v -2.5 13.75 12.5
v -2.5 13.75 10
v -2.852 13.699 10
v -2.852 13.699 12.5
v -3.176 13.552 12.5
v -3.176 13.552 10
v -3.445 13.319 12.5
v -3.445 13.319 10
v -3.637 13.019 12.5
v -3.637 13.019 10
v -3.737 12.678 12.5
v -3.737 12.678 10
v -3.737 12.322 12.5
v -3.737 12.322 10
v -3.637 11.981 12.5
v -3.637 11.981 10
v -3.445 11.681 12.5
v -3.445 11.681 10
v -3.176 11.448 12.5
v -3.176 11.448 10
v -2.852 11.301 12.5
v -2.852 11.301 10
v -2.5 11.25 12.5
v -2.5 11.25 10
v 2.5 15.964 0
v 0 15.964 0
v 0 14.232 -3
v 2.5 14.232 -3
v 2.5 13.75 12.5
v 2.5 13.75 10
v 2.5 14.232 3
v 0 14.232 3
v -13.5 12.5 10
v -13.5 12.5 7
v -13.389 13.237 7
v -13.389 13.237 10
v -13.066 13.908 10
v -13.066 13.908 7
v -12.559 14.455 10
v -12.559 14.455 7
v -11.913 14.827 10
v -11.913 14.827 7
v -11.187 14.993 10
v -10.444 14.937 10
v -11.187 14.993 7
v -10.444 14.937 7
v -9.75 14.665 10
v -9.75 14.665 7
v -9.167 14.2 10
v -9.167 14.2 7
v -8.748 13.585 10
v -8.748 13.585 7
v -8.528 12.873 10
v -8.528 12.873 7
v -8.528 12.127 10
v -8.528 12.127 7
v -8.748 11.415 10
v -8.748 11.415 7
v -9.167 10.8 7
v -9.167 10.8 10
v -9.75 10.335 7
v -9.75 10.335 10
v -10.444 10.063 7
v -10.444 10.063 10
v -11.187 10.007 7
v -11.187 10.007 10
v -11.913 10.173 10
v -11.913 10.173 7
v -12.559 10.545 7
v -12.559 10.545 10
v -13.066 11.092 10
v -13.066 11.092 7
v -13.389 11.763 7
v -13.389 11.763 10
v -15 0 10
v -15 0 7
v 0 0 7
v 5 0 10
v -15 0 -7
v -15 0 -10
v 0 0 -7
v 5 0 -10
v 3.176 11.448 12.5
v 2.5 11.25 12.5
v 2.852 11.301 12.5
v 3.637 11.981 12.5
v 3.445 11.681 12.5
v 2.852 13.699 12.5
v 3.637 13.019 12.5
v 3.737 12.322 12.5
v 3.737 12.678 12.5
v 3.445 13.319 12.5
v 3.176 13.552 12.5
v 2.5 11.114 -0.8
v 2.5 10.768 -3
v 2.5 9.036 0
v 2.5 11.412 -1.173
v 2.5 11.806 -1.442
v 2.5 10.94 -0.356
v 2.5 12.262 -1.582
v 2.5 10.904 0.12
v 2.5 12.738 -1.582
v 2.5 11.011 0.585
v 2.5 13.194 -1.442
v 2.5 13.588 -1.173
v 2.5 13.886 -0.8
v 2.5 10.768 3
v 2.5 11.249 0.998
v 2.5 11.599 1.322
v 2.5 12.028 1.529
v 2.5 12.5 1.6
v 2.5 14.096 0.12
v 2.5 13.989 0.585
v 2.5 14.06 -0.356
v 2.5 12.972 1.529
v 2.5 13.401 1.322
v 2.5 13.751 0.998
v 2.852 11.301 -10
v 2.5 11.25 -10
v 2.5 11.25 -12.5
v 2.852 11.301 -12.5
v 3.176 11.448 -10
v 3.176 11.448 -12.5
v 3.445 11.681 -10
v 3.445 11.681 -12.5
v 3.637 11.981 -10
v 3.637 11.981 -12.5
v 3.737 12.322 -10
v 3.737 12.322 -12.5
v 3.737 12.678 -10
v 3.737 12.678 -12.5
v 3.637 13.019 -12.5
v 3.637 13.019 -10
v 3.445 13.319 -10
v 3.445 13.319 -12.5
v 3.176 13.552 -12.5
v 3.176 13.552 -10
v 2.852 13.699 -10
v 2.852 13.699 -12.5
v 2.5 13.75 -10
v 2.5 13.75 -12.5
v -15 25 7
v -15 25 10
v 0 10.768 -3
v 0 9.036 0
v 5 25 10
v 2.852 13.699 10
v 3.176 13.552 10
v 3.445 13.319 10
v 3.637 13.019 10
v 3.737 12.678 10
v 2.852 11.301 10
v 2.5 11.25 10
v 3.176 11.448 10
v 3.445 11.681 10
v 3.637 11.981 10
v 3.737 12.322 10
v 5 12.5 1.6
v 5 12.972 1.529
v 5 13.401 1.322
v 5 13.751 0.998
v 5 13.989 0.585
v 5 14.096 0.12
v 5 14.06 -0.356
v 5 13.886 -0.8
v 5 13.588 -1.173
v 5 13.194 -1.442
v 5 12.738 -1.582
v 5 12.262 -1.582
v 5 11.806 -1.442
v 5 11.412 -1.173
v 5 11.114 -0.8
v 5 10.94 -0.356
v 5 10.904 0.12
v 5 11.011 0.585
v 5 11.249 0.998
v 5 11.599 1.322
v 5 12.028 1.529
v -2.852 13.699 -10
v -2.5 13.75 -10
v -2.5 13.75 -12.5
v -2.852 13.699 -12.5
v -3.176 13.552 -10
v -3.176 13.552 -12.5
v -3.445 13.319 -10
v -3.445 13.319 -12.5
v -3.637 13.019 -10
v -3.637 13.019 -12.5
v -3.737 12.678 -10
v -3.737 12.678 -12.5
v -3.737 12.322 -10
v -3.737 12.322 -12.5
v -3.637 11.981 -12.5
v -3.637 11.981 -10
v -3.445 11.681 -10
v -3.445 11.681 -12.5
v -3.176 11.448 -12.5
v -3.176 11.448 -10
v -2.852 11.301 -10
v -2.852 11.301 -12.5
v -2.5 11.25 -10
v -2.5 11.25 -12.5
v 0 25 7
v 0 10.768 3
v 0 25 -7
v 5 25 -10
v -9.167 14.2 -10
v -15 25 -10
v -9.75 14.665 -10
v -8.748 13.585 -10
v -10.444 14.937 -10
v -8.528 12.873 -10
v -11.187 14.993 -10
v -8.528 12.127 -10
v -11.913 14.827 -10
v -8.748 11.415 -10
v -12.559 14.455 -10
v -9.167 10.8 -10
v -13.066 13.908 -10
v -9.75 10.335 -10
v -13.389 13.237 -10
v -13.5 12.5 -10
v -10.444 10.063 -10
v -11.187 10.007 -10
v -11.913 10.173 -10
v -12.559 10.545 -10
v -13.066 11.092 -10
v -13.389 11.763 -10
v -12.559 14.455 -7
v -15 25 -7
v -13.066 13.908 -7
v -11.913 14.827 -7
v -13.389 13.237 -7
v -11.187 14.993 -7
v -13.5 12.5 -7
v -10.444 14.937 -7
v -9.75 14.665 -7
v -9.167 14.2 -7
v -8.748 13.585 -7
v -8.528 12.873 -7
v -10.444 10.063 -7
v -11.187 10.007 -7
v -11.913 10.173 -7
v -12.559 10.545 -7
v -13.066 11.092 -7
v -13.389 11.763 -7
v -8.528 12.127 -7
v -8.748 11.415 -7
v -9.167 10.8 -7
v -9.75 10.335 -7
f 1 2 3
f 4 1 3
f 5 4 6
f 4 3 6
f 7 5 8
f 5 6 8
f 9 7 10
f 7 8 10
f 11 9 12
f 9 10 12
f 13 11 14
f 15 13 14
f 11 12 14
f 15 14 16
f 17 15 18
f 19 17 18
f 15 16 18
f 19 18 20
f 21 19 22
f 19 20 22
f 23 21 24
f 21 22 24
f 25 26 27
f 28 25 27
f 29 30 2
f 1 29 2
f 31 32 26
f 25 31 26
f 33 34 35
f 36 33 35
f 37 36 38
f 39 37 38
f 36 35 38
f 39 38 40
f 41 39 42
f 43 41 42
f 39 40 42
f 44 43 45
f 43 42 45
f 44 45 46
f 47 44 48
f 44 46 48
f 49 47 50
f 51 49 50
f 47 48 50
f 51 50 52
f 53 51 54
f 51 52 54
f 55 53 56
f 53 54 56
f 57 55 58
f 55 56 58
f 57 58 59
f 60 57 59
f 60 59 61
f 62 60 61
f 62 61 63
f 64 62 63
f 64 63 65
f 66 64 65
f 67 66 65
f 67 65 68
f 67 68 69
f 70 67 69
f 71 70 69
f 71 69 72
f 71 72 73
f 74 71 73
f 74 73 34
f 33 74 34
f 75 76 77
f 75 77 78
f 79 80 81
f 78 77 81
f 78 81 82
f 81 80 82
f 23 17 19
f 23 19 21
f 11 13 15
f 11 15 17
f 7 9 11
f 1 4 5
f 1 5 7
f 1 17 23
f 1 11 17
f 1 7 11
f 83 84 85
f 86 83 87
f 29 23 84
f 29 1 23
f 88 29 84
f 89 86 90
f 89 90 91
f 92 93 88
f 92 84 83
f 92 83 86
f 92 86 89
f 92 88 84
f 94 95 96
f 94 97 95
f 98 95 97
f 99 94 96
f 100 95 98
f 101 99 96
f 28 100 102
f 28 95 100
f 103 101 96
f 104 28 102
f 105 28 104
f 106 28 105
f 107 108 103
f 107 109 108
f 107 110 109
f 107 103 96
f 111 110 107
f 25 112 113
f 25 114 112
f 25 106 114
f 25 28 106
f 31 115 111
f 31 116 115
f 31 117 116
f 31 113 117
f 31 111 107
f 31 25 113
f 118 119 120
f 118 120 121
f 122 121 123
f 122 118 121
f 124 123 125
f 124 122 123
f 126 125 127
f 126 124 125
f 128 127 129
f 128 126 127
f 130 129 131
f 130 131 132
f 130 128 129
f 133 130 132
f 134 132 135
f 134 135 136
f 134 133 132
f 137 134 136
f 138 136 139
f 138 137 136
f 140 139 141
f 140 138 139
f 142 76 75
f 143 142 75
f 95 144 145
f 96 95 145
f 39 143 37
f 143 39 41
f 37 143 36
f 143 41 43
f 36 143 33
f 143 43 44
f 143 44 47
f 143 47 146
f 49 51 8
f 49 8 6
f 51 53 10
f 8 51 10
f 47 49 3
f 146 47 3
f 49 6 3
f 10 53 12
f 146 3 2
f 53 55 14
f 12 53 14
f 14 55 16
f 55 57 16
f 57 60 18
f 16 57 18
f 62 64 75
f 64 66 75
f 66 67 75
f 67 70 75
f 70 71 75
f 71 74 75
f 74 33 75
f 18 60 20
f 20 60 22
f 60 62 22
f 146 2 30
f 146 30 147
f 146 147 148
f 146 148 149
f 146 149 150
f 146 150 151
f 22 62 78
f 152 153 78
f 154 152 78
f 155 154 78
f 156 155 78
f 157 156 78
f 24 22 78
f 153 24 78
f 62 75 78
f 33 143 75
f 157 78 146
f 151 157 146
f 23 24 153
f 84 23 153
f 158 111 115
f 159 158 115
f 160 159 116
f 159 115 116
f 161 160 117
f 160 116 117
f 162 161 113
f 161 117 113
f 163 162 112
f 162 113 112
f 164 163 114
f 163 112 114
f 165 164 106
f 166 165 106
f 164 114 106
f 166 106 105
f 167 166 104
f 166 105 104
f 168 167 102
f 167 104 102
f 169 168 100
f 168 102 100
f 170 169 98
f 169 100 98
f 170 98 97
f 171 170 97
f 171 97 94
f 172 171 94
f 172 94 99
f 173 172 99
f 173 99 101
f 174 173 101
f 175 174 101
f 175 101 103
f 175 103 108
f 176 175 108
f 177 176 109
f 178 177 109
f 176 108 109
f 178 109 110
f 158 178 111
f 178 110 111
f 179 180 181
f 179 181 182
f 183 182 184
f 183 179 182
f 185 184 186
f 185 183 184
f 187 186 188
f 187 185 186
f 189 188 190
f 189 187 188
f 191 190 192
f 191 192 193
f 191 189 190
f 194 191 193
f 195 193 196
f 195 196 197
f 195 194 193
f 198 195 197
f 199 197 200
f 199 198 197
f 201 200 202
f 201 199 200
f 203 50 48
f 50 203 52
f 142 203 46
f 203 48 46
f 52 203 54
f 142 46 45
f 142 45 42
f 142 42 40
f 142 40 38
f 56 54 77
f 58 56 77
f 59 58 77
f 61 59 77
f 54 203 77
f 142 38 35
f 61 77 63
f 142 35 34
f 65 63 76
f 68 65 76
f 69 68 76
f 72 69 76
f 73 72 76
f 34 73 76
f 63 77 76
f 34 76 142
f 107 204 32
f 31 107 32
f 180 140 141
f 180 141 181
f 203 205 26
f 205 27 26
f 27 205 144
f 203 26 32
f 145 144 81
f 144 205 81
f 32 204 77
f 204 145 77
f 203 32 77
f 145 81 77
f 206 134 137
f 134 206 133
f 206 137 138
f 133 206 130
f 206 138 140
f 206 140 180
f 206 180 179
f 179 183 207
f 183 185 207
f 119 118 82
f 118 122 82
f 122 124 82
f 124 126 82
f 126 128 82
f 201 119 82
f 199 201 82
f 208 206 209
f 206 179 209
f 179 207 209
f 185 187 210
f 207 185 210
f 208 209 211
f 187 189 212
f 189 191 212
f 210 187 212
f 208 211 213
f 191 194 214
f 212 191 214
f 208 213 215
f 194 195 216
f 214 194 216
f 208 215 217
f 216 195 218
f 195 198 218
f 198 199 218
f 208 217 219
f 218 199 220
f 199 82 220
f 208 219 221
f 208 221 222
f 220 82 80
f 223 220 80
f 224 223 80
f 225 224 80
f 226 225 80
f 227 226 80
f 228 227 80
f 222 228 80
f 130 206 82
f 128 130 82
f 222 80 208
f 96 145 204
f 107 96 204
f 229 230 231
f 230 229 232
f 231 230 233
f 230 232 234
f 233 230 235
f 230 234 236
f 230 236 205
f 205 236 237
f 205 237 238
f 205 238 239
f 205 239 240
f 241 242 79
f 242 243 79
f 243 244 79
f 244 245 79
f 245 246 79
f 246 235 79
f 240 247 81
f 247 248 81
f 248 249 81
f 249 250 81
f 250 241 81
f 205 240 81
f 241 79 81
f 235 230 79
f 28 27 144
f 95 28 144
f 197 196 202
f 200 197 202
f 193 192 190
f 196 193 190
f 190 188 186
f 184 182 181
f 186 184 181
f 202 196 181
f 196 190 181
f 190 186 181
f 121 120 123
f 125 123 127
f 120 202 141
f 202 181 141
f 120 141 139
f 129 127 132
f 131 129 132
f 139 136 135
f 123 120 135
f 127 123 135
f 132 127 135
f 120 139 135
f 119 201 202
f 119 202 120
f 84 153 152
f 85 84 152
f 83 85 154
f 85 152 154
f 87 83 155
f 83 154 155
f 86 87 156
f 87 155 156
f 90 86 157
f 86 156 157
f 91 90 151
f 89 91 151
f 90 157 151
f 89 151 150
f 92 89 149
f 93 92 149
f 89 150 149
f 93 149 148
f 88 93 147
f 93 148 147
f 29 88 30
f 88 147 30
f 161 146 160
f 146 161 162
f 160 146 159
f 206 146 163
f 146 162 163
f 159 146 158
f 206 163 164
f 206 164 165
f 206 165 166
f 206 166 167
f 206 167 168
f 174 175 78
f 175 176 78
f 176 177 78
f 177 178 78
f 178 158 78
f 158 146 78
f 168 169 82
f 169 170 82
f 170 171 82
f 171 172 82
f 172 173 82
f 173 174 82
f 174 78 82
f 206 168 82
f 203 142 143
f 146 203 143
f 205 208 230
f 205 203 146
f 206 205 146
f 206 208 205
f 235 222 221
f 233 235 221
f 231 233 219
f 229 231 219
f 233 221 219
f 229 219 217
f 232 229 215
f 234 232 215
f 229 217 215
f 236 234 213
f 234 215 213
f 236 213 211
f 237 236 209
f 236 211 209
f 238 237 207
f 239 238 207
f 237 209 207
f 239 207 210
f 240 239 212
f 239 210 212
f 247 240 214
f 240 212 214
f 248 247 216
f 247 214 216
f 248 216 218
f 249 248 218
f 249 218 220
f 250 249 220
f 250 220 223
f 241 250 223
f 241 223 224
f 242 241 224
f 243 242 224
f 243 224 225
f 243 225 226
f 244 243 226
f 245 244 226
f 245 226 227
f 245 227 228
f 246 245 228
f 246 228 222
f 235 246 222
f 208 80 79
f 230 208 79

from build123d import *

# Parameters (mm, degrees)
EXTRUDE_1_DEPTH     = 25
CUT_EXTRUDE_1_DEPTH = 2.5
SKETCH_3_R          = 1.6
CUT_EXTRUDE_2_DEPTH = 2.5
EXTRUDE_2_DEPTH     = 2.5
SKETCH_5_R          = 2.5
CUT_EXTRUDE_3_DEPTH = 37.827299657


with BuildPart() as part:
    # Эскиз1 → Бобышка-Вытянуть1 (new body)
    with BuildSketch(Plane(origin=(0, 0, 0), x_dir=(1, 0, 0), z_dir=(0, 1, 0))):
        Polygon((0, 7), (0, -7), (-15, -7), (-15, -10), (5, -10), (5, 10), (-15, 10), (-15, 7), align=None)
    extrude(amount=EXTRUDE_1_DEPTH)

    # Эскиз2 → Вырез-Вытянуть1 (cut)
    with BuildSketch(Plane.ZY):
        Polygon((3, 14.232050808), (0, 15.964101615), (-3, 14.232050808), (-3, 10.767949192), (0, 9.035898385), (3, 10.767949192), align=None)
    extrude(amount=-CUT_EXTRUDE_1_DEPTH, mode=Mode.SUBTRACT)

    # Эскиз3 → Вырез-Вытянуть2 (cut)
    with BuildSketch(Plane.ZY.offset(-2.5)):
        with Locations((0, 12.5)):
            Circle(SKETCH_3_R)
    extrude(amount=-CUT_EXTRUDE_2_DEPTH, mode=Mode.SUBTRACT)

    # Эскиз4 → Бобышка-Вытянуть2 (add)
    with BuildSketch(Plane(origin=(0, 0, -10), x_dir=(-1, 0, 0), z_dir=(0, 0, -1))):
        with BuildLine():
            Line((-2.5, 13.75), (2.5, 13.75))
            ThreePointArc((2.5, 13.75), (3.75, 12.5), (2.5, 11.25))
            Line((2.5, 11.25), (-2.5, 11.25))
            ThreePointArc((-2.5, 11.25), (-3.75, 12.5), (-2.5, 13.75))
        make_face()
    extrude_2 = extrude(amount=EXTRUDE_2_DEPTH)

    # Зеркальное отражение1: Бобышка-Вытянуть2 across plane
    add(extrude_2.mirror(Plane(origin=(0, 0, 0), x_dir=(1, 0, 0), z_dir=(0, 0, -1))))

    # Эскиз5 → Вырез-Вытянуть3 (cut, through all)
    with BuildSketch(Plane(origin=(0, 0, -10), x_dir=(-1, 0, 0), z_dir=(0, 0, -1))):
        with Locations((11, 12.5)):
            Circle(SKETCH_5_R)
    extrude(amount=-CUT_EXTRUDE_3_DEPTH, mode=Mode.SUBTRACT)


solid = part.part
